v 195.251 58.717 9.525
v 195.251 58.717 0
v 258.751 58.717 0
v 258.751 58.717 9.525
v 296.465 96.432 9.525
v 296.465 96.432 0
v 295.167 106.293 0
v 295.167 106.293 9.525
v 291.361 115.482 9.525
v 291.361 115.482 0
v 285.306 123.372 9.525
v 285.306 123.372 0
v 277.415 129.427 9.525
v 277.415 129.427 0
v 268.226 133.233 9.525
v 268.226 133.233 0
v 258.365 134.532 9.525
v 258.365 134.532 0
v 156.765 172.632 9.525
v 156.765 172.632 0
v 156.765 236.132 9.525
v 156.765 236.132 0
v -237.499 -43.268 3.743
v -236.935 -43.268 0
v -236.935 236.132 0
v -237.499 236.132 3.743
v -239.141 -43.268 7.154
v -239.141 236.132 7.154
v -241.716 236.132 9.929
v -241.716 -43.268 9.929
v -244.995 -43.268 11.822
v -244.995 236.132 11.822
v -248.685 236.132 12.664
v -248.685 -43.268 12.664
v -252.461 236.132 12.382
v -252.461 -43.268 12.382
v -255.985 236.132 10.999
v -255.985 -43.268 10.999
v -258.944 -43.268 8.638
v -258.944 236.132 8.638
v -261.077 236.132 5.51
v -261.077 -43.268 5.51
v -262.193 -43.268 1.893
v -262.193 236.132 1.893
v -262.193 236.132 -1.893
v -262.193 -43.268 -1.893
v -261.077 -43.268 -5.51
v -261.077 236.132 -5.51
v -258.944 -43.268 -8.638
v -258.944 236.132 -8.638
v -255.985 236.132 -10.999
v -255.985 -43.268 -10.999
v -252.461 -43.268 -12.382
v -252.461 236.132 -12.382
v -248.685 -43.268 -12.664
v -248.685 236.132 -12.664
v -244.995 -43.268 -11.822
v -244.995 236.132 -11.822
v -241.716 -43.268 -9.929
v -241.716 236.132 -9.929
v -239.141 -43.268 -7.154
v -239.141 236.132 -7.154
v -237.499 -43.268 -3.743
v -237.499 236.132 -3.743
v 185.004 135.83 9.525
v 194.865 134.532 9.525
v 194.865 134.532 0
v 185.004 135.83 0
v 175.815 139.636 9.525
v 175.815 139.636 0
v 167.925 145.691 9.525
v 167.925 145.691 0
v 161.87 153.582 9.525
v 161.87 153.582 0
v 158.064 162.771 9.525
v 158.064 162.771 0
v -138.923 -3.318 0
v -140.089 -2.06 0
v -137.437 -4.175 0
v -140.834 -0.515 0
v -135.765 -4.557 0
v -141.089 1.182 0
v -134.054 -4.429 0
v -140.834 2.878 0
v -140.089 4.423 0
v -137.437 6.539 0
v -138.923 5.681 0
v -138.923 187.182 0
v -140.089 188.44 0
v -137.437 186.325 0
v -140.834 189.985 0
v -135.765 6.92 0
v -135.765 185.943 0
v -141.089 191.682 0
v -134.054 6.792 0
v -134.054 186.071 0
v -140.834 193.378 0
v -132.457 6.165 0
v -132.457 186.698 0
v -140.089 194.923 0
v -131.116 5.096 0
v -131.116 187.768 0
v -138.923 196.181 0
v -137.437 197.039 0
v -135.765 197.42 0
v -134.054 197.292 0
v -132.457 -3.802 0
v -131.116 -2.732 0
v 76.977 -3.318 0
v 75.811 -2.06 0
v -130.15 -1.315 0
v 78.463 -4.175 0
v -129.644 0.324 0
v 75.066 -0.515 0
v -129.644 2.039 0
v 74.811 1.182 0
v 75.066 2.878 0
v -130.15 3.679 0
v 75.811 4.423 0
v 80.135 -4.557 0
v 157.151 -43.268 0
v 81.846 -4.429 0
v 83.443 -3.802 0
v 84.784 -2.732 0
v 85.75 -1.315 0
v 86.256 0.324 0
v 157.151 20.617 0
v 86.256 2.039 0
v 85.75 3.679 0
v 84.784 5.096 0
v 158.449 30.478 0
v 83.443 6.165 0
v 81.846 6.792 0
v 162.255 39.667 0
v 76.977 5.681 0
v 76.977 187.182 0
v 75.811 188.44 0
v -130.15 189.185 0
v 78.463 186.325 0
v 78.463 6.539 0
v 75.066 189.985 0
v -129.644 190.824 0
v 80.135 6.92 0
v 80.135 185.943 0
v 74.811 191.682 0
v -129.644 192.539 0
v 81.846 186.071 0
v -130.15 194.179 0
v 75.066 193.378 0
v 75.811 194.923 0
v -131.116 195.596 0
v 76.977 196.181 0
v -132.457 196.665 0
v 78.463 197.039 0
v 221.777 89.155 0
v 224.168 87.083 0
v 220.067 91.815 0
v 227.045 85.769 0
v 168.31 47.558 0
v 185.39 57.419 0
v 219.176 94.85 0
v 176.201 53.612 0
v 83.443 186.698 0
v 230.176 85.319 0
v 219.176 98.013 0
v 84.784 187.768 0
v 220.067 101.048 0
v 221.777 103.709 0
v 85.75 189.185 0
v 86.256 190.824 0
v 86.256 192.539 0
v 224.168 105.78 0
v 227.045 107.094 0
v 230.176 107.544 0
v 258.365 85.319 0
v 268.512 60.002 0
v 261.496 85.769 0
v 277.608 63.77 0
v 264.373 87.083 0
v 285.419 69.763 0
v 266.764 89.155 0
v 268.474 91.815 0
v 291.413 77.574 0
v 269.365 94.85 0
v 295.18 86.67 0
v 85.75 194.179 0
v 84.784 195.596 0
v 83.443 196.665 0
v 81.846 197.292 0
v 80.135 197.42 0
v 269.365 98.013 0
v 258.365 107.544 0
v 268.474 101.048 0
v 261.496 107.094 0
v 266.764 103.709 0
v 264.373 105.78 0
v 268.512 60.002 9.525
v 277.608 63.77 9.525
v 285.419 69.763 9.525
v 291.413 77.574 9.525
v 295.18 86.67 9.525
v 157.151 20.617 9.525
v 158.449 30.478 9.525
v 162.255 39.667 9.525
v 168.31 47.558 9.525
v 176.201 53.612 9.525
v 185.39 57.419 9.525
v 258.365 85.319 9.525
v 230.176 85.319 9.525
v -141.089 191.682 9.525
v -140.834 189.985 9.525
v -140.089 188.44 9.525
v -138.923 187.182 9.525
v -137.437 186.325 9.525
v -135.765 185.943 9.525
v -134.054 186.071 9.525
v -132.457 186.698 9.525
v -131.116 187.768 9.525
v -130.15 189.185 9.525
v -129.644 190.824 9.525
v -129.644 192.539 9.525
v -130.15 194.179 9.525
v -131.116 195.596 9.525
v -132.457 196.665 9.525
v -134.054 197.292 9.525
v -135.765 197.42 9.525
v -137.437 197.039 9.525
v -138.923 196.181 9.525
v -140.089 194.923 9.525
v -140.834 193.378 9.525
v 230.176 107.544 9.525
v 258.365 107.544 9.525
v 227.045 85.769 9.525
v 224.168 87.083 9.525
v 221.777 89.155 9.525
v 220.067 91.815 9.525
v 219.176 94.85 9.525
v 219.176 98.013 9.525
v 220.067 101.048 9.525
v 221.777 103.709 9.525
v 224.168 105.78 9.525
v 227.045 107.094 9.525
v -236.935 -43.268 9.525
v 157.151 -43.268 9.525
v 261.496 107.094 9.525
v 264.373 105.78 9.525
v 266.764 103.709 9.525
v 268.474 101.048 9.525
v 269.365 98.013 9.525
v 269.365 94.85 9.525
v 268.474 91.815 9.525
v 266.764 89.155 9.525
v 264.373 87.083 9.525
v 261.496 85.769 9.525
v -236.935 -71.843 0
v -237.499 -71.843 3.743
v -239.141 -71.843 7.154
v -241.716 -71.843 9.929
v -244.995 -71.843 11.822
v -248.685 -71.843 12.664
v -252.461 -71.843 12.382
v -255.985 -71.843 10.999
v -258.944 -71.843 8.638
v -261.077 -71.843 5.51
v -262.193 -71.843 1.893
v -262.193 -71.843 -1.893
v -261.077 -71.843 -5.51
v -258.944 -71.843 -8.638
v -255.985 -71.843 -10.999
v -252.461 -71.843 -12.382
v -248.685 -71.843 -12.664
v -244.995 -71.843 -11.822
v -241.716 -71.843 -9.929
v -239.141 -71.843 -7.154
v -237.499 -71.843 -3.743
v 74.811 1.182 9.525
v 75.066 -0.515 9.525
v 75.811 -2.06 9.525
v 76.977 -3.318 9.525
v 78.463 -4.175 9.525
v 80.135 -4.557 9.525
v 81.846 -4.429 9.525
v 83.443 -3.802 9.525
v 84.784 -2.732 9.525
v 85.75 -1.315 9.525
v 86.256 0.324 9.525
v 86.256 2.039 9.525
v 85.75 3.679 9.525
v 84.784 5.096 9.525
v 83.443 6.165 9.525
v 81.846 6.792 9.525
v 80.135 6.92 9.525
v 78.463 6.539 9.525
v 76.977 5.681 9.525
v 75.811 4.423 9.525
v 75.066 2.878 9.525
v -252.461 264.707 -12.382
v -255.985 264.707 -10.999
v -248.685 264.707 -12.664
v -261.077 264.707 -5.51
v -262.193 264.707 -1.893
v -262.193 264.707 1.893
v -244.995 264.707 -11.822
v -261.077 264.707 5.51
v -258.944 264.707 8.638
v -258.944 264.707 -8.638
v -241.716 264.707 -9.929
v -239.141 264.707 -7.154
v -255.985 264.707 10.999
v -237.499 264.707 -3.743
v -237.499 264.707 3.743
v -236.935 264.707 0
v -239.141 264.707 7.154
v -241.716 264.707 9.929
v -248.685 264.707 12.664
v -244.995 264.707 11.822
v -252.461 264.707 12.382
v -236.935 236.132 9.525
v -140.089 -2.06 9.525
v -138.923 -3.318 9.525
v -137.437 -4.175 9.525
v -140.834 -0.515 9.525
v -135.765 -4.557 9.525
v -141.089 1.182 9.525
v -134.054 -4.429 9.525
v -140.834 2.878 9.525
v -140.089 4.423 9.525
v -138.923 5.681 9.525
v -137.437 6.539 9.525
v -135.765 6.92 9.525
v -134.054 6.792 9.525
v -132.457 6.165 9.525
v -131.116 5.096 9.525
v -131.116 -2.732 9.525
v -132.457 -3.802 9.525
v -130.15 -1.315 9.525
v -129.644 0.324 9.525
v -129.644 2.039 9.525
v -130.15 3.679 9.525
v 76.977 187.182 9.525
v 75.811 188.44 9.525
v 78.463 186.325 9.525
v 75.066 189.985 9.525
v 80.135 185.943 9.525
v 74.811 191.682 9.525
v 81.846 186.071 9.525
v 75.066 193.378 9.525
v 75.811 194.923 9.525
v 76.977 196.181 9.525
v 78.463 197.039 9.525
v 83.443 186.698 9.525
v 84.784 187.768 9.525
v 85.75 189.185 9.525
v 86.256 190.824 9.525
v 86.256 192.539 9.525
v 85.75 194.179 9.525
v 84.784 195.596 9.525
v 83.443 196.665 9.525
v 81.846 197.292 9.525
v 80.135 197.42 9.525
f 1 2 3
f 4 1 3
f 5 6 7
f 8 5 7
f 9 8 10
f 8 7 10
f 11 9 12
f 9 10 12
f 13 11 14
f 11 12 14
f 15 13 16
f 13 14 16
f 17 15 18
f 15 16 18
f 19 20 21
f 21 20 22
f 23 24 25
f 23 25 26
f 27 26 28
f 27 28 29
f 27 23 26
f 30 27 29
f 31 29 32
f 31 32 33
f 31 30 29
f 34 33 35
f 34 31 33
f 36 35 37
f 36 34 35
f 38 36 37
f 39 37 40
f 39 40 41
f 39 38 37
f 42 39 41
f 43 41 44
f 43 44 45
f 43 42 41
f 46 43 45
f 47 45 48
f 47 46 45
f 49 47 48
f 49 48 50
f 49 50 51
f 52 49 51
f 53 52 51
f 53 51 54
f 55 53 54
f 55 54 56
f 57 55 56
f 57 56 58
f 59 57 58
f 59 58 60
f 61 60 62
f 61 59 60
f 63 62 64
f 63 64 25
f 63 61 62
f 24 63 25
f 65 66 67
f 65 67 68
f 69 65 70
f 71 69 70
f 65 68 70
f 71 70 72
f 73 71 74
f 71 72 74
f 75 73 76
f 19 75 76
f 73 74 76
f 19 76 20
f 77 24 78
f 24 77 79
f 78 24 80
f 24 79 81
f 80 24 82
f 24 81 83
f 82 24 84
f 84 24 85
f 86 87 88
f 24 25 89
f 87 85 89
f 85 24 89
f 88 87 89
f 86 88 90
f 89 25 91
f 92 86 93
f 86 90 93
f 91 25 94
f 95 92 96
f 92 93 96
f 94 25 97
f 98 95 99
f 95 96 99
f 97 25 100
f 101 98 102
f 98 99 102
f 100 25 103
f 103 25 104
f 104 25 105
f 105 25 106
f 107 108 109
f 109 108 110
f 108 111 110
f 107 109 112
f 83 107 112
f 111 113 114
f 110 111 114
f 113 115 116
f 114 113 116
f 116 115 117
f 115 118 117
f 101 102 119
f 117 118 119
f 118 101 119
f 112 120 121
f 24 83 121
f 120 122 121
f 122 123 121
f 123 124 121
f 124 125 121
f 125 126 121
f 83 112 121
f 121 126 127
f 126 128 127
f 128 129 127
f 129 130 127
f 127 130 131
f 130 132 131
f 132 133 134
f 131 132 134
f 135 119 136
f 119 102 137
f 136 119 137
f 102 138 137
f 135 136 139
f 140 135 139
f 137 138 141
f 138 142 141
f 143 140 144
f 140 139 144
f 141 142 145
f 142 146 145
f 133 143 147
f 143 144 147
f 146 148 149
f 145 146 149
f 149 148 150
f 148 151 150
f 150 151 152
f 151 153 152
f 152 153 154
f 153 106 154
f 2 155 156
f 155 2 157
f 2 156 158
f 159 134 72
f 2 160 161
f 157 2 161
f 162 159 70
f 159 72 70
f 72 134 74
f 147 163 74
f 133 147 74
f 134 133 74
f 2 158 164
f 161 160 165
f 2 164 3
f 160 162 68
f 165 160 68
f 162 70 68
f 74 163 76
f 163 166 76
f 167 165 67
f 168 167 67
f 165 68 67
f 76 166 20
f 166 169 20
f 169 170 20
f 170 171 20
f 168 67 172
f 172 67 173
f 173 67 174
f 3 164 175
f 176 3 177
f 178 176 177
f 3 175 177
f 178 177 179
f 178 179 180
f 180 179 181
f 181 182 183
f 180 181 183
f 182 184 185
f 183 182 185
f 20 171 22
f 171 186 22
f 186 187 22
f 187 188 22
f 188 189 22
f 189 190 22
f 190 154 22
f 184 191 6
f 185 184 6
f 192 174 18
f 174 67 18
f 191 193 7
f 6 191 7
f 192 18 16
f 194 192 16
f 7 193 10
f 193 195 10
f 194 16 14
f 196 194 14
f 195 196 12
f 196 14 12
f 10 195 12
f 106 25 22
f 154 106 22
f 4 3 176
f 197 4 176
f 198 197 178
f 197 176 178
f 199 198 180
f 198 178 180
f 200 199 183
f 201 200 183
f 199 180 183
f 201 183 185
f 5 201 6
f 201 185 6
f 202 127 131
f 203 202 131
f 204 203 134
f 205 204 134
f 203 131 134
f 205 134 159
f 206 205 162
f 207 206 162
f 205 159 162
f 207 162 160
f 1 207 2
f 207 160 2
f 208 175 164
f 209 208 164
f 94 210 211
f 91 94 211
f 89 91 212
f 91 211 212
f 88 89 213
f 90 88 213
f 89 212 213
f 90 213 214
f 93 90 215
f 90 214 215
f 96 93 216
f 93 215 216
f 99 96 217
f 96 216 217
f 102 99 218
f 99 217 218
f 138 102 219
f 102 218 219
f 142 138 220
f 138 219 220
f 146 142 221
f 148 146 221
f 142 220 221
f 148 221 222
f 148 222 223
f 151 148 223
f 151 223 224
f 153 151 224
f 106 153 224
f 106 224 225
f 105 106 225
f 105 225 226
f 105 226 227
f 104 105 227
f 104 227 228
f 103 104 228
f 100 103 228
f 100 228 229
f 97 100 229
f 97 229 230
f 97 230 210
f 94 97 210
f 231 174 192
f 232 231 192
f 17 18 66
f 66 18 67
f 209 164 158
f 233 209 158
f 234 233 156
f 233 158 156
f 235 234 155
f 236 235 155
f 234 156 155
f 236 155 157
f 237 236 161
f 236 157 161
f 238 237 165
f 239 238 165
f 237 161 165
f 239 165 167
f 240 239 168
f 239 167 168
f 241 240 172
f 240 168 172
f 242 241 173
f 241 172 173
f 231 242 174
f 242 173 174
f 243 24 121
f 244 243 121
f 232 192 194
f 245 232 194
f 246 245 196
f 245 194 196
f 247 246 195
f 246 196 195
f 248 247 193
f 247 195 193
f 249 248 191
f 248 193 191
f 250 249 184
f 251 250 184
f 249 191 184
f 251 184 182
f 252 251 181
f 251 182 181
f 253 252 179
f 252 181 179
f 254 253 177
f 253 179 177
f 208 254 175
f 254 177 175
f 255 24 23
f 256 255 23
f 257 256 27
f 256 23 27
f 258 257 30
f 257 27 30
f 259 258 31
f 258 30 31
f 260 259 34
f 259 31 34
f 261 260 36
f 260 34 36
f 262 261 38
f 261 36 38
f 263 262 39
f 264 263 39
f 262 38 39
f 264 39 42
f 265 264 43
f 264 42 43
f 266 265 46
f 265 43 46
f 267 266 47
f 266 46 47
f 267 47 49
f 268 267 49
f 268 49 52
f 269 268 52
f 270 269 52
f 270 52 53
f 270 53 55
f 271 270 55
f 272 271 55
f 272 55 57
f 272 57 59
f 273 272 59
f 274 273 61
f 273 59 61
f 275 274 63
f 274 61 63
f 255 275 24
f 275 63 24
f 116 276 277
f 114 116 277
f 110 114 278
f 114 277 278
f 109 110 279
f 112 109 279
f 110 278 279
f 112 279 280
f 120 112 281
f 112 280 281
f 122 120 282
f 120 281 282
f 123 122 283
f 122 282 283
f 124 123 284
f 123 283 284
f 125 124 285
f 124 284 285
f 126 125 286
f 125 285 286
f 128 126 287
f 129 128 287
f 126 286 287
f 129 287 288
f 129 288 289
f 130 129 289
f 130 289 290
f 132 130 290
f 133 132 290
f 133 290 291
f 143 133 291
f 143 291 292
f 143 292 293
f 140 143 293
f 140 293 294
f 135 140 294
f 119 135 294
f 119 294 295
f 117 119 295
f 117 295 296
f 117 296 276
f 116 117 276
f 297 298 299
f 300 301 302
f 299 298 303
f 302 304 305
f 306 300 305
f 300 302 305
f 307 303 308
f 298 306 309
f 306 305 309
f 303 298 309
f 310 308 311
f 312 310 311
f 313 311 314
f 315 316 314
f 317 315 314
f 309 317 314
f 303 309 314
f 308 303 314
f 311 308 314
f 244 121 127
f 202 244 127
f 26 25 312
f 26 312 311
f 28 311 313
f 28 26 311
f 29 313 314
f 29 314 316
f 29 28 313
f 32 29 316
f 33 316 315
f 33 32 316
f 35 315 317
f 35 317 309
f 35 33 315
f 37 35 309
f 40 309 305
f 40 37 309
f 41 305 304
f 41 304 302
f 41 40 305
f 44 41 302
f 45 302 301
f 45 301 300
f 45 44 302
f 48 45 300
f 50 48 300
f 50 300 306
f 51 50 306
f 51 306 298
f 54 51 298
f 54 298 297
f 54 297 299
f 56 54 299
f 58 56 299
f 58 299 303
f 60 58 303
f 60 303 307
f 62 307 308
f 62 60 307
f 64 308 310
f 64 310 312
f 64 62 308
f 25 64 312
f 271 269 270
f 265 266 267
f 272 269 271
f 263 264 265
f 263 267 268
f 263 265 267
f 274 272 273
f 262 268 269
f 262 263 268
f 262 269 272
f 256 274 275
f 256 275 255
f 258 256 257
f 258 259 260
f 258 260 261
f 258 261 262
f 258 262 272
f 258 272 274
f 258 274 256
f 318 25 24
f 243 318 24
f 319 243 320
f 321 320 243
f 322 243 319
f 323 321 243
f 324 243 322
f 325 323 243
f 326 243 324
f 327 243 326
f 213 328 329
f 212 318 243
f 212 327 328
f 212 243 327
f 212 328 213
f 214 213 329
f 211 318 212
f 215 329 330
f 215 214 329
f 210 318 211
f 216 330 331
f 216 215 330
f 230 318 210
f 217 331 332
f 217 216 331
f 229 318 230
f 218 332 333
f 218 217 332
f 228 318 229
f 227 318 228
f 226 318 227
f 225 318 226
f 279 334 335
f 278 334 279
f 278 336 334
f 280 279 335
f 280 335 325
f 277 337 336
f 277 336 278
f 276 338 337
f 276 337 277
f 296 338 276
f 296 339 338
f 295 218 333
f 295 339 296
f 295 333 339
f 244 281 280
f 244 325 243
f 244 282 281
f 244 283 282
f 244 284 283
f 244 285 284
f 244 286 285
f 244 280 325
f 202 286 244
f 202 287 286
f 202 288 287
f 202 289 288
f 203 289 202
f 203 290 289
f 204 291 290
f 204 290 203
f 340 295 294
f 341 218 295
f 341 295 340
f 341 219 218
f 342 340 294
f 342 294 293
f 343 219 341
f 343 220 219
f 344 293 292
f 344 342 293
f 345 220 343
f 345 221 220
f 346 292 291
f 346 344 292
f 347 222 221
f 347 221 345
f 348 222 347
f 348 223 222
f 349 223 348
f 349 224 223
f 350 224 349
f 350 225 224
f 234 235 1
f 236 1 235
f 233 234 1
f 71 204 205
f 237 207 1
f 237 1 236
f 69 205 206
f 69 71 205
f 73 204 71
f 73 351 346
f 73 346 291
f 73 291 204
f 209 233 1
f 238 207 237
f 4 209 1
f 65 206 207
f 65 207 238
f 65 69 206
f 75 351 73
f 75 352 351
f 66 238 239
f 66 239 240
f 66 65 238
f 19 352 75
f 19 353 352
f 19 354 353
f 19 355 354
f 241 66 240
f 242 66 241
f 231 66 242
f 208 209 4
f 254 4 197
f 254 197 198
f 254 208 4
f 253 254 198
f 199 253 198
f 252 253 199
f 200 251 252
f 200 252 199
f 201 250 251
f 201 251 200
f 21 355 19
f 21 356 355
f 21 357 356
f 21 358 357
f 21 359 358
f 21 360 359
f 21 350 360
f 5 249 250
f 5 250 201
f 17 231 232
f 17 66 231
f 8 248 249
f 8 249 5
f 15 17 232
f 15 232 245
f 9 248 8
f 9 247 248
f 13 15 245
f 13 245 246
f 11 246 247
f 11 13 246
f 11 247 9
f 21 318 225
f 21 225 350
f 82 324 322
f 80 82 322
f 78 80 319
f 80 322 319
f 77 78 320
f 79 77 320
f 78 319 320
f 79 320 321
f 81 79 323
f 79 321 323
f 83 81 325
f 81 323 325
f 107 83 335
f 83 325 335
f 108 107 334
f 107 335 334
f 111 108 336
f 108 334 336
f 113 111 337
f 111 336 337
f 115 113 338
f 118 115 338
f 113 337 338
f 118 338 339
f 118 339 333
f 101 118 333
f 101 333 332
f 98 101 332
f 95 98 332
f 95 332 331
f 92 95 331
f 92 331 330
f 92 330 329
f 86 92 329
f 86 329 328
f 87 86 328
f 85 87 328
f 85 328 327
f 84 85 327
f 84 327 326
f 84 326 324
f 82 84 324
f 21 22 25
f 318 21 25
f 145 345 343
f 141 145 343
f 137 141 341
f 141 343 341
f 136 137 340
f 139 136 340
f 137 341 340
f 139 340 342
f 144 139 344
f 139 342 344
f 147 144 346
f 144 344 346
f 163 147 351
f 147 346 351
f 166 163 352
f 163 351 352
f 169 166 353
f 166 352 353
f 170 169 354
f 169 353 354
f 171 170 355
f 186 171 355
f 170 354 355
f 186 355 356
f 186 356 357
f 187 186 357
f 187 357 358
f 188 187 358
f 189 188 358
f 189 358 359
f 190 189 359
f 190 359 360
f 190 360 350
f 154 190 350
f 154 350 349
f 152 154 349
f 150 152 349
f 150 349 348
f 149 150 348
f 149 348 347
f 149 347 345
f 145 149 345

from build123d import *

# Parameters (mm, degrees)
F1_DEPTH = 9.525
F2_D     = 11.509375
F3_R     = 12.7
F4_DEPTH = 279.4
F5_DEPTH = 28.575
F6_DEPTH = 28.575


with BuildPart() as f1:
    # F0 (on Top) → F1 (new body)
    with BuildSketch(Plane.XY):
        with BuildLine():
            Line((-135.3345345497, 236.1316870544), (-236.9345345497, 236.1316870544))
            Line((-236.9345345497, 236.1316870544), (-236.9345345497, -43.2683129456))
            Line((-236.9345345497, -43.2683129456), (157.1505398512, -43.2683129456))
            Line((157.1505398512, -43.2683129456), (157.1505398512, 20.6167614553))
            ThreePointArc((157.1505398512, 20.6167614553), (168.309771488, 47.5575298185), (195.2505398512, 58.7167614553))
            Line((195.2505398512, 58.7167614553), (258.7505398512, 58.7167614553))
            ThreePointArc((258.7505398512, 58.7167614553), (285.4190194943, 69.7632074114), (296.4654654503, 96.4316870544))
            ThreePointArc((296.4654654503, 96.4316870544), (285.3062338135, 123.3724554176), (258.3654654503, 134.5316870544))
            Line((258.3654654503, 134.5316870544), (194.8654654503, 134.5316870544))
            ThreePointArc((194.8654654503, 134.5316870544), (167.9246970871, 145.6909186912), (156.7654654503, 172.6316870544))
            Line((156.7654654503, 172.6316870544), (156.7654654503, 236.1316870544))
            Line((156.7654654503, 236.1316870544), (80.5654654503, 236.1316870544))
            Line((80.5654654503, 236.1316870544), (-135.3345345497, 236.1316870544))
        make_face()
        with BuildLine():
            Line((230.1755398512, 107.5441870544), (258.3654654503, 107.5441870544))
            ThreePointArc((258.3654654503, 107.5441870544), (269.4779654503, 96.4316870544), (258.3654654503, 85.3191870544))
            Line((258.3654654503, 85.3191870544), (230.1755398512, 85.3191870544))
            ThreePointArc((230.1755398512, 85.3191870544), (219.0630398512, 96.4316870544), (230.1755398512, 107.5441870544))
        make_face(mode=Mode.SUBTRACT)
    extrude(amount=F1_DEPTH)

    # F2 (through all)
    with Locations(Plane(origin=(0, 0, 0), x_dir=(1, 0, 0), z_dir=(0, 0, -1))):
        with Locations((-135.3345345497, -191.6816870544), (80.5654654503, -191.6816870544), (80.5654654503, -1.1816870544), (-135.3345345497, -1.1816870544)):
            Hole(F2_D / 2)



with BuildPart() as f4:
    # F3 (on face) → F4 (new body, through all)
    with BuildSketch(Plane.XZ.offset(43.2683129456)):
        with Locations((-249.6345345497, 0)):
            Circle(F3_R)
    extrude(amount=-F4_DEPTH)


with BuildPart() as f1_1:
    add(f1.part)
    # F5 (add): a face of the model
    f5_faces = [f4.part.faces().sort_by_distance(p)[0] for p in [
        (-249.6345345497, -43.2683129456, 0),
    ]]

    add(f4.part)  # F5 merges F4
    extrude(f5_faces, amount=F5_DEPTH)

    # F6 (add): a face of the model
    f6_faces = [f1_1.faces().sort_by_distance(p)[0] for p in [
        (-249.6345345497, 236.1316870544, 0),
    ]]
    extrude(f6_faces, amount=F6_DEPTH)


solid = f1_1.part
